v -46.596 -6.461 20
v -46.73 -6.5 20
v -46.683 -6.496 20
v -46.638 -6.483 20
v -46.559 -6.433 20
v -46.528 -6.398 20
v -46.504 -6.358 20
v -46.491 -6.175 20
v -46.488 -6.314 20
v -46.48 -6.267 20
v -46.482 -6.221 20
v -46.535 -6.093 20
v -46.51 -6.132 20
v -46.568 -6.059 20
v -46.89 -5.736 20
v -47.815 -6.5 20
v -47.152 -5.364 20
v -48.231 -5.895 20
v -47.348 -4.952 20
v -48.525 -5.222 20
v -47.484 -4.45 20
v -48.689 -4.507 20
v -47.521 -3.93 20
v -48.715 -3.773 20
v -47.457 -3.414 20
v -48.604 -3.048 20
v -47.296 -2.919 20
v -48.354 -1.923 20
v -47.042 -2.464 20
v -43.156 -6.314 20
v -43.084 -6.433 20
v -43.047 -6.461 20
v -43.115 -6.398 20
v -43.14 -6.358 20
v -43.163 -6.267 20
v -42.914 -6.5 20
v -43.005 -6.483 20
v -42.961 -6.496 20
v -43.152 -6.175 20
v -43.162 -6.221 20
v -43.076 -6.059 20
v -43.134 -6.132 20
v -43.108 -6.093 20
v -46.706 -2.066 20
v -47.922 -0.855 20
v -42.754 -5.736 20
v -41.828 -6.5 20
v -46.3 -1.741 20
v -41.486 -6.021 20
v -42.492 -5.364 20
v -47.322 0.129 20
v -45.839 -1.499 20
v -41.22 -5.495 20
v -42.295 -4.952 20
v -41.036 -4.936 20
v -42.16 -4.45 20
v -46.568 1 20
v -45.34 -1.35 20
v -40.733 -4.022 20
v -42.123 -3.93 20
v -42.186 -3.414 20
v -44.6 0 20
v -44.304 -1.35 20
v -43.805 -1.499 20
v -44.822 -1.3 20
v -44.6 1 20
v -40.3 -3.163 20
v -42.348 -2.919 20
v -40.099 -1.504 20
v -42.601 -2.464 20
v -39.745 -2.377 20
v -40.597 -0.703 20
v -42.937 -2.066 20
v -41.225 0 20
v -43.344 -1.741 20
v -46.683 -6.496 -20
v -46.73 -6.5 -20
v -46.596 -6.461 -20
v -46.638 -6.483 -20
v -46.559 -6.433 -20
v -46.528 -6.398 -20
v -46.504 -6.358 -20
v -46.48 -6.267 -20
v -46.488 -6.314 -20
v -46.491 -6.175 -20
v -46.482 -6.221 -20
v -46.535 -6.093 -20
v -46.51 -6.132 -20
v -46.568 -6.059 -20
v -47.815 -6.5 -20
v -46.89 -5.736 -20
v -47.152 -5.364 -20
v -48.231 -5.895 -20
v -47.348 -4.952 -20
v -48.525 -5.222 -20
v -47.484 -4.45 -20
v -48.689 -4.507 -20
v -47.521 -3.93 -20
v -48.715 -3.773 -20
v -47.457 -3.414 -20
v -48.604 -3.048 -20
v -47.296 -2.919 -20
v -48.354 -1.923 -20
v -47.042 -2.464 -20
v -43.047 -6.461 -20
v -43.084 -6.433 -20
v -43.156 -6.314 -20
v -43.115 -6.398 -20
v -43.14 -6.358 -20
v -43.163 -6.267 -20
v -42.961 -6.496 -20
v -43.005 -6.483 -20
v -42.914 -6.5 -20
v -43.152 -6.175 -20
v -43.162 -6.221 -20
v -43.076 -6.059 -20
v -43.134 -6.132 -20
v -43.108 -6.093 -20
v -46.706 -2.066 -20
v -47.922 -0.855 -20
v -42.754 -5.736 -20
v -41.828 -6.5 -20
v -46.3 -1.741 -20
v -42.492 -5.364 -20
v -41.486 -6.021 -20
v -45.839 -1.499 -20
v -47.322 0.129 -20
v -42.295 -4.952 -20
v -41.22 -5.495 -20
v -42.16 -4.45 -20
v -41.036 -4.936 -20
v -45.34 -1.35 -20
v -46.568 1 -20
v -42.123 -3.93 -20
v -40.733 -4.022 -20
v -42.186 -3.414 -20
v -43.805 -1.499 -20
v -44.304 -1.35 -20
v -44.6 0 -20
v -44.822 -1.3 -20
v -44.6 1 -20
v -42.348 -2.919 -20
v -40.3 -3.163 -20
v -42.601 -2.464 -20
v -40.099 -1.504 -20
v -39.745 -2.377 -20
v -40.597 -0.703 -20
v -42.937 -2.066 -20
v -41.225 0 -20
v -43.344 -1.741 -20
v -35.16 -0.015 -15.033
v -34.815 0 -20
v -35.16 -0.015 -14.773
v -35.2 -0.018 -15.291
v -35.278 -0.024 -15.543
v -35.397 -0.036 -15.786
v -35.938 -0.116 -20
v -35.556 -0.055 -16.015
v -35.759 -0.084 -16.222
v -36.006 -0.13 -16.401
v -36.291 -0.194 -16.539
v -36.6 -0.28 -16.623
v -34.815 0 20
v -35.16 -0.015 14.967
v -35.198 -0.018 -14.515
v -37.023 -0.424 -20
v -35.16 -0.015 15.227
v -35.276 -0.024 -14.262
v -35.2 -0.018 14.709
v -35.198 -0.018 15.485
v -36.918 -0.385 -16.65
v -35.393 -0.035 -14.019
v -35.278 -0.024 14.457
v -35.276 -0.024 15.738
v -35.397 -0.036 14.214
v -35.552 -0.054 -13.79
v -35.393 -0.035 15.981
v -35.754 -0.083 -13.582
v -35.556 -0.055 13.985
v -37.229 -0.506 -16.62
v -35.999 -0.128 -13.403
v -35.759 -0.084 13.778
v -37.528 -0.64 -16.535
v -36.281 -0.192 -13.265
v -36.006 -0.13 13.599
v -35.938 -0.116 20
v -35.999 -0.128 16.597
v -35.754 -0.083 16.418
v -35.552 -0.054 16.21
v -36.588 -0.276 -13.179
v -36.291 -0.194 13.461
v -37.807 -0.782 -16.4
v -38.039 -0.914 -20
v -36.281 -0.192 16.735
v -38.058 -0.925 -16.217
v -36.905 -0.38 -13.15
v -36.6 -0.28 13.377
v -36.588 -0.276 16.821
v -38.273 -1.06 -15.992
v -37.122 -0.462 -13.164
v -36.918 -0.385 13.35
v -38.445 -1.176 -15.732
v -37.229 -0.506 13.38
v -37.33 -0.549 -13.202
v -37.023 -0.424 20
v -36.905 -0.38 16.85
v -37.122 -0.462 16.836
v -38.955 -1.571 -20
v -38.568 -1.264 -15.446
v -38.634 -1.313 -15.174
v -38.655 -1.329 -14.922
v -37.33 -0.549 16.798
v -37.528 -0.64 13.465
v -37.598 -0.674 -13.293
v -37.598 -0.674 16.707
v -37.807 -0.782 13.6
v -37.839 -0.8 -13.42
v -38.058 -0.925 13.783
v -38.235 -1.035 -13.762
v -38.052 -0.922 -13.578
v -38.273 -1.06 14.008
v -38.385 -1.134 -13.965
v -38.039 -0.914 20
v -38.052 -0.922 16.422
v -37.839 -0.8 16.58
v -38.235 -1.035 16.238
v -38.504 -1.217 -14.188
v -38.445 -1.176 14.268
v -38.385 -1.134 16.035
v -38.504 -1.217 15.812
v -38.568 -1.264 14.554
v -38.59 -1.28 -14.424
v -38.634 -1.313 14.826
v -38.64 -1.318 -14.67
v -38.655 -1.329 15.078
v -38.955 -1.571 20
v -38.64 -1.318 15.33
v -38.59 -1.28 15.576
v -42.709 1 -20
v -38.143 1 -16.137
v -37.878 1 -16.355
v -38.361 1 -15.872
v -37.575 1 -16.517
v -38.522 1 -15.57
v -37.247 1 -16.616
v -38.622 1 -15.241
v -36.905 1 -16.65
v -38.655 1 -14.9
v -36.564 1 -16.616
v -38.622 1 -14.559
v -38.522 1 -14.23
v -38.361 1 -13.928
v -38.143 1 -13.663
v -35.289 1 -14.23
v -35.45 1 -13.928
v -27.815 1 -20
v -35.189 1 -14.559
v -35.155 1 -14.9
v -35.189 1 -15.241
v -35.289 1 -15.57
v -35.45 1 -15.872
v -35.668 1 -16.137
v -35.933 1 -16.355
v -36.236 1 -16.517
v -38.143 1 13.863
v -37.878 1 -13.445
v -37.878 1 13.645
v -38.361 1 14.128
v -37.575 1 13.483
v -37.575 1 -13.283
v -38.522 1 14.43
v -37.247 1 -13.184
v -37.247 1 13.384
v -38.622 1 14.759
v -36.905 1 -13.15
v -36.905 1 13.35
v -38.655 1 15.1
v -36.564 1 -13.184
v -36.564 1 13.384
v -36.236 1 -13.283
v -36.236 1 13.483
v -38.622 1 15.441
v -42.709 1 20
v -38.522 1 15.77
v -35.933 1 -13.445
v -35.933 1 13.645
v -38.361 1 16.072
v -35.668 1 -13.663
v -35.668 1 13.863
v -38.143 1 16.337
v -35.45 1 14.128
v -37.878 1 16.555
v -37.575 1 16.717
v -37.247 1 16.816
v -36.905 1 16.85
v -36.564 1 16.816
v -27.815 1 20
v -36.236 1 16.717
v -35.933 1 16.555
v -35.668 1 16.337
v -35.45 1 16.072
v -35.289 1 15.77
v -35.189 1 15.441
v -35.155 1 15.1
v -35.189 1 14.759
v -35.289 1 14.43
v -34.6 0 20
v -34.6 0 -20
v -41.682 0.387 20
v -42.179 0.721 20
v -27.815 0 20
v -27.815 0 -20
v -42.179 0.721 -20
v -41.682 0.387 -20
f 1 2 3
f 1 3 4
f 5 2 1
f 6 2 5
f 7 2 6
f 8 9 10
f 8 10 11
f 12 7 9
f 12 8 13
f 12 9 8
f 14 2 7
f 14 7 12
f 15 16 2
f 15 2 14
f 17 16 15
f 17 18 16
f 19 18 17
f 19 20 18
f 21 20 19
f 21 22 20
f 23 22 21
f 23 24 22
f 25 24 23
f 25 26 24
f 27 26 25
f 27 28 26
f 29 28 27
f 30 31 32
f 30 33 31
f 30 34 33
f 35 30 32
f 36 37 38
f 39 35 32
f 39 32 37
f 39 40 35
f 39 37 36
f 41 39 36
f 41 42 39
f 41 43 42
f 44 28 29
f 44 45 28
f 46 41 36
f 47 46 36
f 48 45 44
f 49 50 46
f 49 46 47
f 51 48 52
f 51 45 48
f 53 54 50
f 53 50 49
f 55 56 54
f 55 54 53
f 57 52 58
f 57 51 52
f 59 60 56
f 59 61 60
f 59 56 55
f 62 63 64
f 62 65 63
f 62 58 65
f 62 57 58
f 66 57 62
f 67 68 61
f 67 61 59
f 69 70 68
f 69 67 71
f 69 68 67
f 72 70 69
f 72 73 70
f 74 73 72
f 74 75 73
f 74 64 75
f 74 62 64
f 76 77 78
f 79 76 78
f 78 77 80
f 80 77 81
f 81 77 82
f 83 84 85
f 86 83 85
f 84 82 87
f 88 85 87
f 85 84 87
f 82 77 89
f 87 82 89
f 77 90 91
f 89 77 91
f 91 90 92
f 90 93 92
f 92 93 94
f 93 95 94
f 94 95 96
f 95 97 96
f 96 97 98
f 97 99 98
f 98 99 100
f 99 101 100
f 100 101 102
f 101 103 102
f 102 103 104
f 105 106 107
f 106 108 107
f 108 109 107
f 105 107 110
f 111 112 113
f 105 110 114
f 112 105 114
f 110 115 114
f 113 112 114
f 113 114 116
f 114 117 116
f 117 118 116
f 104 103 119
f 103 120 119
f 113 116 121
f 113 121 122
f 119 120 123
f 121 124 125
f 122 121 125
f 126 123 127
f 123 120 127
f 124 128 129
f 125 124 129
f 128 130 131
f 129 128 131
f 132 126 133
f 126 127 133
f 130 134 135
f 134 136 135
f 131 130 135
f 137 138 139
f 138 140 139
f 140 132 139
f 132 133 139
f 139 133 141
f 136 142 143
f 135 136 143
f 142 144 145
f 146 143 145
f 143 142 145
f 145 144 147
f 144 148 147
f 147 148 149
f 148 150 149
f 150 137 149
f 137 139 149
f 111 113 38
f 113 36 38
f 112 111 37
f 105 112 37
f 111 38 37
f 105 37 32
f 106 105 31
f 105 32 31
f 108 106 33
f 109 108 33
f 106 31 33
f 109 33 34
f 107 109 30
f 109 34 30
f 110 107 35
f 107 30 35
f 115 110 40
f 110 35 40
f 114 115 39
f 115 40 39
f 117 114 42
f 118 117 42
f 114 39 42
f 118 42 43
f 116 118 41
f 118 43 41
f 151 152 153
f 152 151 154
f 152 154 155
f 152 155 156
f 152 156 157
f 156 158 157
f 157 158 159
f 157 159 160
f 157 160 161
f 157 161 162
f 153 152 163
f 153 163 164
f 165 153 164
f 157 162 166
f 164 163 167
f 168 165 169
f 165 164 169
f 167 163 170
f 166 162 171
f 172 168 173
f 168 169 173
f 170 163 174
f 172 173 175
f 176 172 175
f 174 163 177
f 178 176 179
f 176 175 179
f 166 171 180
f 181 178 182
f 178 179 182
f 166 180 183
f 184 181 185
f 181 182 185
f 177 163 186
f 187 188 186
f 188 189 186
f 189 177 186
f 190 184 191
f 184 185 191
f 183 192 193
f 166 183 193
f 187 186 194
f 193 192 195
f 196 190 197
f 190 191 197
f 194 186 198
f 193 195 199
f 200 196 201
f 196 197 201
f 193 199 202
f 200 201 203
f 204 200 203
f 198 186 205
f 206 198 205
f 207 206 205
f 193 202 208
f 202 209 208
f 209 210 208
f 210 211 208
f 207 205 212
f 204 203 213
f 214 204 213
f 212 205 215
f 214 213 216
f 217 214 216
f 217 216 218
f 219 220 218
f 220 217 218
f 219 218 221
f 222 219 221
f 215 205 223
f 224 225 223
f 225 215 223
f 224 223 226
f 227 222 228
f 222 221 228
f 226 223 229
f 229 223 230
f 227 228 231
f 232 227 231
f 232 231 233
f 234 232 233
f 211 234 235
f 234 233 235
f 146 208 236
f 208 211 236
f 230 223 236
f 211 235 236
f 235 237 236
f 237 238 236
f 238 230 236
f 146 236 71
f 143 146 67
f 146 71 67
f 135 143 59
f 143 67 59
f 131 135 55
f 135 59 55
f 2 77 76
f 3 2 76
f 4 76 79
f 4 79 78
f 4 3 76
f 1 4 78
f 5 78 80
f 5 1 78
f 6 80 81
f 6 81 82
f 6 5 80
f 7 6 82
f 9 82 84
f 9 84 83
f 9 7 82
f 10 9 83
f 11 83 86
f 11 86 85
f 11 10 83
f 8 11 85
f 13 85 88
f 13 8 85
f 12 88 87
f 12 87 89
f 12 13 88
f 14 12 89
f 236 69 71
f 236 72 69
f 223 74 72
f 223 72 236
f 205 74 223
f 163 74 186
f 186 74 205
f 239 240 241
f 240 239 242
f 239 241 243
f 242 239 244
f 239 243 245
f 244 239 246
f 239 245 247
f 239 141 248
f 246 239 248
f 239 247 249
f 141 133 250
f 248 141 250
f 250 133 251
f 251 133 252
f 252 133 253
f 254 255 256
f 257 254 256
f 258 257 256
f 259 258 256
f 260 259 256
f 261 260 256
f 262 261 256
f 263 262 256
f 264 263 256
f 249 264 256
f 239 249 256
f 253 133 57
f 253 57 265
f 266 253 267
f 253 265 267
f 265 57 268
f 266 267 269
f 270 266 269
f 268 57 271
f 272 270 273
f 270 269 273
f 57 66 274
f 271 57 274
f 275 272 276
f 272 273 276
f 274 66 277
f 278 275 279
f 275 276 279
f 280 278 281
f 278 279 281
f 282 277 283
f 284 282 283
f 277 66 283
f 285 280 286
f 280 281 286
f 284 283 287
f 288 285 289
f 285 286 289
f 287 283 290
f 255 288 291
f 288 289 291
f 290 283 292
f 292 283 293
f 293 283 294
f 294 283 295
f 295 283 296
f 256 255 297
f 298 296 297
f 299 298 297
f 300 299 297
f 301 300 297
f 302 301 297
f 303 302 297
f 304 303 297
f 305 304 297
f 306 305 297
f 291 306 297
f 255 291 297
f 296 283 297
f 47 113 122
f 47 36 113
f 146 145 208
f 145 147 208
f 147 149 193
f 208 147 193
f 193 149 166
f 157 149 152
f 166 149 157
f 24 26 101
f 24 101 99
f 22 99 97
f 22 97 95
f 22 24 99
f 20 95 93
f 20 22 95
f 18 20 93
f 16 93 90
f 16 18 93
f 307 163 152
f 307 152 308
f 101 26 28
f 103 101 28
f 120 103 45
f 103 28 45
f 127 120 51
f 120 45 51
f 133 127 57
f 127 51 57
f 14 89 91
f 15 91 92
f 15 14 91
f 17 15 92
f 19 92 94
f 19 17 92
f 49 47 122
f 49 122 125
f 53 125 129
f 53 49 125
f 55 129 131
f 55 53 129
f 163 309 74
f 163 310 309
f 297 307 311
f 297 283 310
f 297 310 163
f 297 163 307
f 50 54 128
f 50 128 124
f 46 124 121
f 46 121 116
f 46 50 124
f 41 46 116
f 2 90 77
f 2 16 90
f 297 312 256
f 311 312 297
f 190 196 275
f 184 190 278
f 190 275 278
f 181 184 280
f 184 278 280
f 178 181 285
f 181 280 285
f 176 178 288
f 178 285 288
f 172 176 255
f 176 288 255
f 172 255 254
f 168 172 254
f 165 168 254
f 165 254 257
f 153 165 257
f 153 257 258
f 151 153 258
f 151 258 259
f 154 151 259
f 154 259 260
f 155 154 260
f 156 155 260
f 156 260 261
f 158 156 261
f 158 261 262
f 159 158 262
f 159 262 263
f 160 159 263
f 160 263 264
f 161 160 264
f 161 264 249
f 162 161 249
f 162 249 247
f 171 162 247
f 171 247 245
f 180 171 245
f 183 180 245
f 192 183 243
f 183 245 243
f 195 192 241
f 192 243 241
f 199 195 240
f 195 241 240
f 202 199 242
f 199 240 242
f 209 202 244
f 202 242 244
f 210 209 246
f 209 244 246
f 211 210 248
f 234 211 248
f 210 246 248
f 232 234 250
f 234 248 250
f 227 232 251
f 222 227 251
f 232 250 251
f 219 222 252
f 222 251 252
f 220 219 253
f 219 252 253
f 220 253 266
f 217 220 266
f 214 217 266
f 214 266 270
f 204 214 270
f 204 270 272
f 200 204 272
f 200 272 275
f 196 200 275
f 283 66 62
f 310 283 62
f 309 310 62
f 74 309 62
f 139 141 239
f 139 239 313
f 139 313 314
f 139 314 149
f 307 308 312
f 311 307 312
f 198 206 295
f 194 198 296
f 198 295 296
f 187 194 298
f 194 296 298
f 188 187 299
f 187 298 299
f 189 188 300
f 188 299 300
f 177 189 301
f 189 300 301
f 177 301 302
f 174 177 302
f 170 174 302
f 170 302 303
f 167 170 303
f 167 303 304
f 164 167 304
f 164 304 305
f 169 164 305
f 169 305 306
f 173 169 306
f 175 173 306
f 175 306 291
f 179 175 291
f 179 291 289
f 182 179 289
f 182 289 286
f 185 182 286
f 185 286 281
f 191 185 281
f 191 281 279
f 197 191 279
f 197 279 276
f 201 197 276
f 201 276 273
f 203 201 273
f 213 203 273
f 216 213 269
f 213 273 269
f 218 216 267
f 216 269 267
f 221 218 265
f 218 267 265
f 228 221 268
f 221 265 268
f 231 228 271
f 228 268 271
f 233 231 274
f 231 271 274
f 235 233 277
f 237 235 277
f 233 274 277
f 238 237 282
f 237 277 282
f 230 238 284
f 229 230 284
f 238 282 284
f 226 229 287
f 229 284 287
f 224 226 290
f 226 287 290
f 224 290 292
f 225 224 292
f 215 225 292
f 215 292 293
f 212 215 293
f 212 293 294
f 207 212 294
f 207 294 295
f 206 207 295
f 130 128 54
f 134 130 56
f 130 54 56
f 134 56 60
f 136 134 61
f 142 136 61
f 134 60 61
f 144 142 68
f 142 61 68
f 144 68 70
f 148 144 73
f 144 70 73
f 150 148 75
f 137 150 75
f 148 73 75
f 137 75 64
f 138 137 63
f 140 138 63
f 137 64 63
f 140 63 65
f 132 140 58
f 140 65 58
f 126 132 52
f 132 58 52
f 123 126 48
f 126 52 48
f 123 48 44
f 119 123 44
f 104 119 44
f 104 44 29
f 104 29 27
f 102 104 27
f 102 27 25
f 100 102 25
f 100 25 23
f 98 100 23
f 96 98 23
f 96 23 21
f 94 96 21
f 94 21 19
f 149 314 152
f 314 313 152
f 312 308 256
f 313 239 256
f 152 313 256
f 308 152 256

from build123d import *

# Parameters (mm, degrees)
EXTRUDE_1_DEPTH                            = 3.9
EXTRUDE_3_DEPTH                            = 20
EXTRUDE_5_DEPTH                            = 20
FILLET_1_R                                 = 0.25
FILLET_1_OF_MIRROR_2_R                     = 0.25
SKETCH_7_R                                 = 5.5
CUT_EXTRUDE_3_DEPTH                        = 69.146236458
MIRROR_3_AT_THE_SECOND_PLANE_COPY_1_SKET_R = 5.5
MIRROR_3_AT_THE_SECOND_PLANE_COPY_1_DEPTH  = 69.146236458
ESQUISSE1_W                                = 44.6
ESQUISSE1_H                                = 40
ENL_V_MAT_EXTRU_1_DEPTH                    = 1.54
ENL_V_MAT_EXTRU_2_DEPTH                    = 57.761068742
ESQUISSE3_W                                = 50
ESQUISSE3_H                                = 1.36
ENL_V_MAT_EXTRU_3_DEPTH                    = 64.372466761
ESQUISSE4_W                                = 27.815449133
ESQUISSE4_H                                = 40
ENL_V_MAT_EXTRU_4_DEPTH                    = 54.066651895
ESQUISSE5_R                                = 1.75
ENL_V_MAT_EXTRU_5_DEPTH                    = 54.198396436


with BuildPart() as part:
    # Эскиз1 → Бобышка-Вытянуть1 (new body)
    with BuildSketch(Plane(origin=(0, 0, 0), x_dir=(1, 0, 0), z_dir=(0, 1, 0))):
        with BuildLine():
            ThreePointArc((-44.6, -23.2), (-43.428427125, -26.028427125), (-40.6, -27.2))
            Line((-40.6, -27.2), (40.6, -27.2))
            ThreePointArc((40.6, -27.2), (43.428427125, -26.028427125), (44.6, -23.2))
            Line((44.6, -23.2), (44.6, 23.2))
            ThreePointArc((44.6, 23.2), (43.428427125, 26.028427125), (40.6, 27.2))
            Line((40.6, 27.2), (33.6, 27.2))
            Line((33.6, 27.2), (-5.4, 27.2))
            Line((-5.4, 27.2), (-40.6, 27.2))
            ThreePointArc((-40.6, 27.2), (-43.428427125, 26.028427125), (-44.6, 23.2))
            Line((-44.6, 23.2), (-44.6, -23.2))
        make_face()
    extrude(amount=EXTRUDE_1_DEPTH)



with BuildPart() as body_2:
    # Эскиз3 → Бобышка-Вытянуть3 (new, symmetric)
    with BuildSketch(Plane.XY):
        with BuildLine():
            Line((-47.815262386, -6.499919999), (-45.841869662, -6.499919999))
            ThreePointArc((-45.841869662, -6.499919999), (-44.821869662, -1.3), (-43.801869662, -6.499919999))
            Line((-43.801869662, -6.499919999), (-41.828476938, -6.499919999))
            ThreePointArc((-41.828476938, -6.499919999), (-44.821869662, -0.1), (-47.815262386, -6.499919999))
        make_face()
    extrude_3 = extrude(amount=EXTRUDE_3_DEPTH, both=True)


with BuildPart() as part_1:
    add(part.part)

    add(body_2.part)  # Бобышка-Вытянуть5 merges body 2
    # Эскиз5 → Бобышка-Вытянуть5 (add, symmetric)
    with BuildSketch(Plane.XY):
        with BuildLine():
            ThreePointArc((-41.631827579, 2.999901942), (-46.932438451, 0.61464415), (-48.60377877, -4.952451312))
            Line((-48.60377877, -4.952451312), (-47.348297278, -4.952451312))
            ThreePointArc((-47.348297278, -4.952451312), (-44.821869662, -1.3), (-42.295442046, -4.952451312))
            Line((-42.295442046, -4.952451312), (-41.039960555, -4.952451312))
            ThreePointArc((-41.039960555, -4.952451312), (-38.684888017, -1.351535806), (-34.6, 0))
            Line((-34.6, 0), (-36.641600827, 0.870983001))
            ThreePointArc((-36.641600827, 0.870983001), (-38.922074934, 2.438561027), (-41.631827579, 2.999901942))
        make_face()
    extrude_5 = extrude(amount=EXTRUDE_5_DEPTH, both=True)

    # Скругление1
    fillet_1_edges = [part_1.edges().sort_by_distance(p)[0] for p in [
        (-43.801869662, -6.499919999, 0),
        (-45.841869662, -6.499919999, 0),
    ]]
    fillet(fillet_1_edges, radius=FILLET_1_R)

    # Зеркальное отражение1: Бобышка-Вытянуть5 across plane
    add(extrude_5.mirror(Plane(origin=(0, 0, 0), x_dir=(0, 0, 1), z_dir=(1, 0, 0))))

    # Зеркальное отражение2: Бобышка-Вытянуть3 across plane
    add(extrude_3.mirror(Plane(origin=(0, 0, 0), x_dir=(0, 0, 1), z_dir=(1, 0, 0))))

    # Скругление1 of Зеркальное отражение2
    fillet_1_of_mirror_2_edges = [part_1.edges().sort_by_distance(p)[0] for p in [
        (43.801869662, -6.499919999, 0),
        (45.841869662, -6.499919999, 0),
    ]]
    fillet(fillet_1_of_mirror_2_edges, radius=FILLET_1_OF_MIRROR_2_R)

    # Эскиз7 → Вырез-Вытянуть3 (cut, through all)
    with BuildSketch(Plane.XY.offset(20)):
        with Locations((-45, -4)):
            Circle(SKETCH_7_R)
    cut_extrude_3 = extrude(amount=CUT_EXTRUDE_3_DEPTH, mode=Mode.SUBTRACT)

    # Зеркальное отражение3: Вырез-Вытянуть3 across plane
    add(cut_extrude_3.mirror(Plane(origin=(0, 0, 0), x_dir=(0, 0, 1), z_dir=(1, 0, 0))), mode=Mode.SUBTRACT)

    # Зеркальное отражение3 at the second plane: Вырез-Вытянуть3 across plane
    add(cut_extrude_3.mirror(Plane.XY), mode=Mode.SUBTRACT)

    # Зеркальное отражение3 at the second plane copy 1 sket → Зеркальное отражение3 at the second plane copy 1 (cut, through all)
    with BuildSketch(Plane(origin=(0, 0, -20), x_dir=(-1, 0, 0), z_dir=(0, 0, -1))):
        with Locations((-45, -4)):
            Circle(MIRROR_3_AT_THE_SECOND_PLANE_COPY_1_SKET_R)
    extrude(amount=MIRROR_3_AT_THE_SECOND_PLANE_COPY_1_DEPTH, mode=Mode.SUBTRACT)

    # Esquisse1 → Enlèv. mat.-Extru.1 (cut)
    with BuildSketch(Plane(origin=(0, 3.9, 0), x_dir=(1, 0, 0), z_dir=(0, 1, 0))):
        with Locations((-22.3, 0)):
            Rectangle(ESQUISSE1_W, ESQUISSE1_H)
    extrude(amount=-ENL_V_MAT_EXTRU_1_DEPTH, mode=Mode.SUBTRACT)

    # Esquisse2 → Enlèv. mat.-Extru.2 (cut, through all)
    with BuildSketch(Plane(origin=(0, 3.9, 0), x_dir=(1, 0, 0), z_dir=(0, 1, 0))):
        Polygon((-44.6, 20), (-44.6, 27.2), (51.6, 27.2), (51.6, -27.2), (-44.6, -27.2), (-44.6, -20), (0, -20), (0, 20), align=None)
    extrude(amount=-ENL_V_MAT_EXTRU_2_DEPTH, mode=Mode.SUBTRACT)

    # Esquisse3 → Enlèv. mat.-Extru.3 (cut, through all)
    with BuildSketch(Plane.XY.offset(20)):
        with Locations((-25, 1.68)):
            Rectangle(ESQUISSE3_W, ESQUISSE3_H)
    extrude(amount=-ENL_V_MAT_EXTRU_3_DEPTH, mode=Mode.SUBTRACT)

    # Esquisse4 → Enlèv. mat.-Extru.4 (cut, through all)
    with BuildSketch(Plane.XZ):
        with Locations((-13.907724567, 0)):
            Rectangle(ESQUISSE4_W, ESQUISSE4_H)
    extrude(amount=-ENL_V_MAT_EXTRU_4_DEPTH, mode=Mode.SUBTRACT)

    # Esquisse5 → Enlèv. mat.-Extru.5 (cut, through all)
    with BuildSketch(Plane(origin=(0, 1, 0), x_dir=(1, 0, 0), z_dir=(0, 1, 0))):
        with Locations((-36.905449133, 14.9)):
            Circle(ESQUISSE5_R)
        with Locations((-36.905449133, -15.1)):
            Circle(ESQUISSE5_R)
    extrude(amount=-ENL_V_MAT_EXTRU_5_DEPTH, mode=Mode.SUBTRACT)


solid = part_1.part
